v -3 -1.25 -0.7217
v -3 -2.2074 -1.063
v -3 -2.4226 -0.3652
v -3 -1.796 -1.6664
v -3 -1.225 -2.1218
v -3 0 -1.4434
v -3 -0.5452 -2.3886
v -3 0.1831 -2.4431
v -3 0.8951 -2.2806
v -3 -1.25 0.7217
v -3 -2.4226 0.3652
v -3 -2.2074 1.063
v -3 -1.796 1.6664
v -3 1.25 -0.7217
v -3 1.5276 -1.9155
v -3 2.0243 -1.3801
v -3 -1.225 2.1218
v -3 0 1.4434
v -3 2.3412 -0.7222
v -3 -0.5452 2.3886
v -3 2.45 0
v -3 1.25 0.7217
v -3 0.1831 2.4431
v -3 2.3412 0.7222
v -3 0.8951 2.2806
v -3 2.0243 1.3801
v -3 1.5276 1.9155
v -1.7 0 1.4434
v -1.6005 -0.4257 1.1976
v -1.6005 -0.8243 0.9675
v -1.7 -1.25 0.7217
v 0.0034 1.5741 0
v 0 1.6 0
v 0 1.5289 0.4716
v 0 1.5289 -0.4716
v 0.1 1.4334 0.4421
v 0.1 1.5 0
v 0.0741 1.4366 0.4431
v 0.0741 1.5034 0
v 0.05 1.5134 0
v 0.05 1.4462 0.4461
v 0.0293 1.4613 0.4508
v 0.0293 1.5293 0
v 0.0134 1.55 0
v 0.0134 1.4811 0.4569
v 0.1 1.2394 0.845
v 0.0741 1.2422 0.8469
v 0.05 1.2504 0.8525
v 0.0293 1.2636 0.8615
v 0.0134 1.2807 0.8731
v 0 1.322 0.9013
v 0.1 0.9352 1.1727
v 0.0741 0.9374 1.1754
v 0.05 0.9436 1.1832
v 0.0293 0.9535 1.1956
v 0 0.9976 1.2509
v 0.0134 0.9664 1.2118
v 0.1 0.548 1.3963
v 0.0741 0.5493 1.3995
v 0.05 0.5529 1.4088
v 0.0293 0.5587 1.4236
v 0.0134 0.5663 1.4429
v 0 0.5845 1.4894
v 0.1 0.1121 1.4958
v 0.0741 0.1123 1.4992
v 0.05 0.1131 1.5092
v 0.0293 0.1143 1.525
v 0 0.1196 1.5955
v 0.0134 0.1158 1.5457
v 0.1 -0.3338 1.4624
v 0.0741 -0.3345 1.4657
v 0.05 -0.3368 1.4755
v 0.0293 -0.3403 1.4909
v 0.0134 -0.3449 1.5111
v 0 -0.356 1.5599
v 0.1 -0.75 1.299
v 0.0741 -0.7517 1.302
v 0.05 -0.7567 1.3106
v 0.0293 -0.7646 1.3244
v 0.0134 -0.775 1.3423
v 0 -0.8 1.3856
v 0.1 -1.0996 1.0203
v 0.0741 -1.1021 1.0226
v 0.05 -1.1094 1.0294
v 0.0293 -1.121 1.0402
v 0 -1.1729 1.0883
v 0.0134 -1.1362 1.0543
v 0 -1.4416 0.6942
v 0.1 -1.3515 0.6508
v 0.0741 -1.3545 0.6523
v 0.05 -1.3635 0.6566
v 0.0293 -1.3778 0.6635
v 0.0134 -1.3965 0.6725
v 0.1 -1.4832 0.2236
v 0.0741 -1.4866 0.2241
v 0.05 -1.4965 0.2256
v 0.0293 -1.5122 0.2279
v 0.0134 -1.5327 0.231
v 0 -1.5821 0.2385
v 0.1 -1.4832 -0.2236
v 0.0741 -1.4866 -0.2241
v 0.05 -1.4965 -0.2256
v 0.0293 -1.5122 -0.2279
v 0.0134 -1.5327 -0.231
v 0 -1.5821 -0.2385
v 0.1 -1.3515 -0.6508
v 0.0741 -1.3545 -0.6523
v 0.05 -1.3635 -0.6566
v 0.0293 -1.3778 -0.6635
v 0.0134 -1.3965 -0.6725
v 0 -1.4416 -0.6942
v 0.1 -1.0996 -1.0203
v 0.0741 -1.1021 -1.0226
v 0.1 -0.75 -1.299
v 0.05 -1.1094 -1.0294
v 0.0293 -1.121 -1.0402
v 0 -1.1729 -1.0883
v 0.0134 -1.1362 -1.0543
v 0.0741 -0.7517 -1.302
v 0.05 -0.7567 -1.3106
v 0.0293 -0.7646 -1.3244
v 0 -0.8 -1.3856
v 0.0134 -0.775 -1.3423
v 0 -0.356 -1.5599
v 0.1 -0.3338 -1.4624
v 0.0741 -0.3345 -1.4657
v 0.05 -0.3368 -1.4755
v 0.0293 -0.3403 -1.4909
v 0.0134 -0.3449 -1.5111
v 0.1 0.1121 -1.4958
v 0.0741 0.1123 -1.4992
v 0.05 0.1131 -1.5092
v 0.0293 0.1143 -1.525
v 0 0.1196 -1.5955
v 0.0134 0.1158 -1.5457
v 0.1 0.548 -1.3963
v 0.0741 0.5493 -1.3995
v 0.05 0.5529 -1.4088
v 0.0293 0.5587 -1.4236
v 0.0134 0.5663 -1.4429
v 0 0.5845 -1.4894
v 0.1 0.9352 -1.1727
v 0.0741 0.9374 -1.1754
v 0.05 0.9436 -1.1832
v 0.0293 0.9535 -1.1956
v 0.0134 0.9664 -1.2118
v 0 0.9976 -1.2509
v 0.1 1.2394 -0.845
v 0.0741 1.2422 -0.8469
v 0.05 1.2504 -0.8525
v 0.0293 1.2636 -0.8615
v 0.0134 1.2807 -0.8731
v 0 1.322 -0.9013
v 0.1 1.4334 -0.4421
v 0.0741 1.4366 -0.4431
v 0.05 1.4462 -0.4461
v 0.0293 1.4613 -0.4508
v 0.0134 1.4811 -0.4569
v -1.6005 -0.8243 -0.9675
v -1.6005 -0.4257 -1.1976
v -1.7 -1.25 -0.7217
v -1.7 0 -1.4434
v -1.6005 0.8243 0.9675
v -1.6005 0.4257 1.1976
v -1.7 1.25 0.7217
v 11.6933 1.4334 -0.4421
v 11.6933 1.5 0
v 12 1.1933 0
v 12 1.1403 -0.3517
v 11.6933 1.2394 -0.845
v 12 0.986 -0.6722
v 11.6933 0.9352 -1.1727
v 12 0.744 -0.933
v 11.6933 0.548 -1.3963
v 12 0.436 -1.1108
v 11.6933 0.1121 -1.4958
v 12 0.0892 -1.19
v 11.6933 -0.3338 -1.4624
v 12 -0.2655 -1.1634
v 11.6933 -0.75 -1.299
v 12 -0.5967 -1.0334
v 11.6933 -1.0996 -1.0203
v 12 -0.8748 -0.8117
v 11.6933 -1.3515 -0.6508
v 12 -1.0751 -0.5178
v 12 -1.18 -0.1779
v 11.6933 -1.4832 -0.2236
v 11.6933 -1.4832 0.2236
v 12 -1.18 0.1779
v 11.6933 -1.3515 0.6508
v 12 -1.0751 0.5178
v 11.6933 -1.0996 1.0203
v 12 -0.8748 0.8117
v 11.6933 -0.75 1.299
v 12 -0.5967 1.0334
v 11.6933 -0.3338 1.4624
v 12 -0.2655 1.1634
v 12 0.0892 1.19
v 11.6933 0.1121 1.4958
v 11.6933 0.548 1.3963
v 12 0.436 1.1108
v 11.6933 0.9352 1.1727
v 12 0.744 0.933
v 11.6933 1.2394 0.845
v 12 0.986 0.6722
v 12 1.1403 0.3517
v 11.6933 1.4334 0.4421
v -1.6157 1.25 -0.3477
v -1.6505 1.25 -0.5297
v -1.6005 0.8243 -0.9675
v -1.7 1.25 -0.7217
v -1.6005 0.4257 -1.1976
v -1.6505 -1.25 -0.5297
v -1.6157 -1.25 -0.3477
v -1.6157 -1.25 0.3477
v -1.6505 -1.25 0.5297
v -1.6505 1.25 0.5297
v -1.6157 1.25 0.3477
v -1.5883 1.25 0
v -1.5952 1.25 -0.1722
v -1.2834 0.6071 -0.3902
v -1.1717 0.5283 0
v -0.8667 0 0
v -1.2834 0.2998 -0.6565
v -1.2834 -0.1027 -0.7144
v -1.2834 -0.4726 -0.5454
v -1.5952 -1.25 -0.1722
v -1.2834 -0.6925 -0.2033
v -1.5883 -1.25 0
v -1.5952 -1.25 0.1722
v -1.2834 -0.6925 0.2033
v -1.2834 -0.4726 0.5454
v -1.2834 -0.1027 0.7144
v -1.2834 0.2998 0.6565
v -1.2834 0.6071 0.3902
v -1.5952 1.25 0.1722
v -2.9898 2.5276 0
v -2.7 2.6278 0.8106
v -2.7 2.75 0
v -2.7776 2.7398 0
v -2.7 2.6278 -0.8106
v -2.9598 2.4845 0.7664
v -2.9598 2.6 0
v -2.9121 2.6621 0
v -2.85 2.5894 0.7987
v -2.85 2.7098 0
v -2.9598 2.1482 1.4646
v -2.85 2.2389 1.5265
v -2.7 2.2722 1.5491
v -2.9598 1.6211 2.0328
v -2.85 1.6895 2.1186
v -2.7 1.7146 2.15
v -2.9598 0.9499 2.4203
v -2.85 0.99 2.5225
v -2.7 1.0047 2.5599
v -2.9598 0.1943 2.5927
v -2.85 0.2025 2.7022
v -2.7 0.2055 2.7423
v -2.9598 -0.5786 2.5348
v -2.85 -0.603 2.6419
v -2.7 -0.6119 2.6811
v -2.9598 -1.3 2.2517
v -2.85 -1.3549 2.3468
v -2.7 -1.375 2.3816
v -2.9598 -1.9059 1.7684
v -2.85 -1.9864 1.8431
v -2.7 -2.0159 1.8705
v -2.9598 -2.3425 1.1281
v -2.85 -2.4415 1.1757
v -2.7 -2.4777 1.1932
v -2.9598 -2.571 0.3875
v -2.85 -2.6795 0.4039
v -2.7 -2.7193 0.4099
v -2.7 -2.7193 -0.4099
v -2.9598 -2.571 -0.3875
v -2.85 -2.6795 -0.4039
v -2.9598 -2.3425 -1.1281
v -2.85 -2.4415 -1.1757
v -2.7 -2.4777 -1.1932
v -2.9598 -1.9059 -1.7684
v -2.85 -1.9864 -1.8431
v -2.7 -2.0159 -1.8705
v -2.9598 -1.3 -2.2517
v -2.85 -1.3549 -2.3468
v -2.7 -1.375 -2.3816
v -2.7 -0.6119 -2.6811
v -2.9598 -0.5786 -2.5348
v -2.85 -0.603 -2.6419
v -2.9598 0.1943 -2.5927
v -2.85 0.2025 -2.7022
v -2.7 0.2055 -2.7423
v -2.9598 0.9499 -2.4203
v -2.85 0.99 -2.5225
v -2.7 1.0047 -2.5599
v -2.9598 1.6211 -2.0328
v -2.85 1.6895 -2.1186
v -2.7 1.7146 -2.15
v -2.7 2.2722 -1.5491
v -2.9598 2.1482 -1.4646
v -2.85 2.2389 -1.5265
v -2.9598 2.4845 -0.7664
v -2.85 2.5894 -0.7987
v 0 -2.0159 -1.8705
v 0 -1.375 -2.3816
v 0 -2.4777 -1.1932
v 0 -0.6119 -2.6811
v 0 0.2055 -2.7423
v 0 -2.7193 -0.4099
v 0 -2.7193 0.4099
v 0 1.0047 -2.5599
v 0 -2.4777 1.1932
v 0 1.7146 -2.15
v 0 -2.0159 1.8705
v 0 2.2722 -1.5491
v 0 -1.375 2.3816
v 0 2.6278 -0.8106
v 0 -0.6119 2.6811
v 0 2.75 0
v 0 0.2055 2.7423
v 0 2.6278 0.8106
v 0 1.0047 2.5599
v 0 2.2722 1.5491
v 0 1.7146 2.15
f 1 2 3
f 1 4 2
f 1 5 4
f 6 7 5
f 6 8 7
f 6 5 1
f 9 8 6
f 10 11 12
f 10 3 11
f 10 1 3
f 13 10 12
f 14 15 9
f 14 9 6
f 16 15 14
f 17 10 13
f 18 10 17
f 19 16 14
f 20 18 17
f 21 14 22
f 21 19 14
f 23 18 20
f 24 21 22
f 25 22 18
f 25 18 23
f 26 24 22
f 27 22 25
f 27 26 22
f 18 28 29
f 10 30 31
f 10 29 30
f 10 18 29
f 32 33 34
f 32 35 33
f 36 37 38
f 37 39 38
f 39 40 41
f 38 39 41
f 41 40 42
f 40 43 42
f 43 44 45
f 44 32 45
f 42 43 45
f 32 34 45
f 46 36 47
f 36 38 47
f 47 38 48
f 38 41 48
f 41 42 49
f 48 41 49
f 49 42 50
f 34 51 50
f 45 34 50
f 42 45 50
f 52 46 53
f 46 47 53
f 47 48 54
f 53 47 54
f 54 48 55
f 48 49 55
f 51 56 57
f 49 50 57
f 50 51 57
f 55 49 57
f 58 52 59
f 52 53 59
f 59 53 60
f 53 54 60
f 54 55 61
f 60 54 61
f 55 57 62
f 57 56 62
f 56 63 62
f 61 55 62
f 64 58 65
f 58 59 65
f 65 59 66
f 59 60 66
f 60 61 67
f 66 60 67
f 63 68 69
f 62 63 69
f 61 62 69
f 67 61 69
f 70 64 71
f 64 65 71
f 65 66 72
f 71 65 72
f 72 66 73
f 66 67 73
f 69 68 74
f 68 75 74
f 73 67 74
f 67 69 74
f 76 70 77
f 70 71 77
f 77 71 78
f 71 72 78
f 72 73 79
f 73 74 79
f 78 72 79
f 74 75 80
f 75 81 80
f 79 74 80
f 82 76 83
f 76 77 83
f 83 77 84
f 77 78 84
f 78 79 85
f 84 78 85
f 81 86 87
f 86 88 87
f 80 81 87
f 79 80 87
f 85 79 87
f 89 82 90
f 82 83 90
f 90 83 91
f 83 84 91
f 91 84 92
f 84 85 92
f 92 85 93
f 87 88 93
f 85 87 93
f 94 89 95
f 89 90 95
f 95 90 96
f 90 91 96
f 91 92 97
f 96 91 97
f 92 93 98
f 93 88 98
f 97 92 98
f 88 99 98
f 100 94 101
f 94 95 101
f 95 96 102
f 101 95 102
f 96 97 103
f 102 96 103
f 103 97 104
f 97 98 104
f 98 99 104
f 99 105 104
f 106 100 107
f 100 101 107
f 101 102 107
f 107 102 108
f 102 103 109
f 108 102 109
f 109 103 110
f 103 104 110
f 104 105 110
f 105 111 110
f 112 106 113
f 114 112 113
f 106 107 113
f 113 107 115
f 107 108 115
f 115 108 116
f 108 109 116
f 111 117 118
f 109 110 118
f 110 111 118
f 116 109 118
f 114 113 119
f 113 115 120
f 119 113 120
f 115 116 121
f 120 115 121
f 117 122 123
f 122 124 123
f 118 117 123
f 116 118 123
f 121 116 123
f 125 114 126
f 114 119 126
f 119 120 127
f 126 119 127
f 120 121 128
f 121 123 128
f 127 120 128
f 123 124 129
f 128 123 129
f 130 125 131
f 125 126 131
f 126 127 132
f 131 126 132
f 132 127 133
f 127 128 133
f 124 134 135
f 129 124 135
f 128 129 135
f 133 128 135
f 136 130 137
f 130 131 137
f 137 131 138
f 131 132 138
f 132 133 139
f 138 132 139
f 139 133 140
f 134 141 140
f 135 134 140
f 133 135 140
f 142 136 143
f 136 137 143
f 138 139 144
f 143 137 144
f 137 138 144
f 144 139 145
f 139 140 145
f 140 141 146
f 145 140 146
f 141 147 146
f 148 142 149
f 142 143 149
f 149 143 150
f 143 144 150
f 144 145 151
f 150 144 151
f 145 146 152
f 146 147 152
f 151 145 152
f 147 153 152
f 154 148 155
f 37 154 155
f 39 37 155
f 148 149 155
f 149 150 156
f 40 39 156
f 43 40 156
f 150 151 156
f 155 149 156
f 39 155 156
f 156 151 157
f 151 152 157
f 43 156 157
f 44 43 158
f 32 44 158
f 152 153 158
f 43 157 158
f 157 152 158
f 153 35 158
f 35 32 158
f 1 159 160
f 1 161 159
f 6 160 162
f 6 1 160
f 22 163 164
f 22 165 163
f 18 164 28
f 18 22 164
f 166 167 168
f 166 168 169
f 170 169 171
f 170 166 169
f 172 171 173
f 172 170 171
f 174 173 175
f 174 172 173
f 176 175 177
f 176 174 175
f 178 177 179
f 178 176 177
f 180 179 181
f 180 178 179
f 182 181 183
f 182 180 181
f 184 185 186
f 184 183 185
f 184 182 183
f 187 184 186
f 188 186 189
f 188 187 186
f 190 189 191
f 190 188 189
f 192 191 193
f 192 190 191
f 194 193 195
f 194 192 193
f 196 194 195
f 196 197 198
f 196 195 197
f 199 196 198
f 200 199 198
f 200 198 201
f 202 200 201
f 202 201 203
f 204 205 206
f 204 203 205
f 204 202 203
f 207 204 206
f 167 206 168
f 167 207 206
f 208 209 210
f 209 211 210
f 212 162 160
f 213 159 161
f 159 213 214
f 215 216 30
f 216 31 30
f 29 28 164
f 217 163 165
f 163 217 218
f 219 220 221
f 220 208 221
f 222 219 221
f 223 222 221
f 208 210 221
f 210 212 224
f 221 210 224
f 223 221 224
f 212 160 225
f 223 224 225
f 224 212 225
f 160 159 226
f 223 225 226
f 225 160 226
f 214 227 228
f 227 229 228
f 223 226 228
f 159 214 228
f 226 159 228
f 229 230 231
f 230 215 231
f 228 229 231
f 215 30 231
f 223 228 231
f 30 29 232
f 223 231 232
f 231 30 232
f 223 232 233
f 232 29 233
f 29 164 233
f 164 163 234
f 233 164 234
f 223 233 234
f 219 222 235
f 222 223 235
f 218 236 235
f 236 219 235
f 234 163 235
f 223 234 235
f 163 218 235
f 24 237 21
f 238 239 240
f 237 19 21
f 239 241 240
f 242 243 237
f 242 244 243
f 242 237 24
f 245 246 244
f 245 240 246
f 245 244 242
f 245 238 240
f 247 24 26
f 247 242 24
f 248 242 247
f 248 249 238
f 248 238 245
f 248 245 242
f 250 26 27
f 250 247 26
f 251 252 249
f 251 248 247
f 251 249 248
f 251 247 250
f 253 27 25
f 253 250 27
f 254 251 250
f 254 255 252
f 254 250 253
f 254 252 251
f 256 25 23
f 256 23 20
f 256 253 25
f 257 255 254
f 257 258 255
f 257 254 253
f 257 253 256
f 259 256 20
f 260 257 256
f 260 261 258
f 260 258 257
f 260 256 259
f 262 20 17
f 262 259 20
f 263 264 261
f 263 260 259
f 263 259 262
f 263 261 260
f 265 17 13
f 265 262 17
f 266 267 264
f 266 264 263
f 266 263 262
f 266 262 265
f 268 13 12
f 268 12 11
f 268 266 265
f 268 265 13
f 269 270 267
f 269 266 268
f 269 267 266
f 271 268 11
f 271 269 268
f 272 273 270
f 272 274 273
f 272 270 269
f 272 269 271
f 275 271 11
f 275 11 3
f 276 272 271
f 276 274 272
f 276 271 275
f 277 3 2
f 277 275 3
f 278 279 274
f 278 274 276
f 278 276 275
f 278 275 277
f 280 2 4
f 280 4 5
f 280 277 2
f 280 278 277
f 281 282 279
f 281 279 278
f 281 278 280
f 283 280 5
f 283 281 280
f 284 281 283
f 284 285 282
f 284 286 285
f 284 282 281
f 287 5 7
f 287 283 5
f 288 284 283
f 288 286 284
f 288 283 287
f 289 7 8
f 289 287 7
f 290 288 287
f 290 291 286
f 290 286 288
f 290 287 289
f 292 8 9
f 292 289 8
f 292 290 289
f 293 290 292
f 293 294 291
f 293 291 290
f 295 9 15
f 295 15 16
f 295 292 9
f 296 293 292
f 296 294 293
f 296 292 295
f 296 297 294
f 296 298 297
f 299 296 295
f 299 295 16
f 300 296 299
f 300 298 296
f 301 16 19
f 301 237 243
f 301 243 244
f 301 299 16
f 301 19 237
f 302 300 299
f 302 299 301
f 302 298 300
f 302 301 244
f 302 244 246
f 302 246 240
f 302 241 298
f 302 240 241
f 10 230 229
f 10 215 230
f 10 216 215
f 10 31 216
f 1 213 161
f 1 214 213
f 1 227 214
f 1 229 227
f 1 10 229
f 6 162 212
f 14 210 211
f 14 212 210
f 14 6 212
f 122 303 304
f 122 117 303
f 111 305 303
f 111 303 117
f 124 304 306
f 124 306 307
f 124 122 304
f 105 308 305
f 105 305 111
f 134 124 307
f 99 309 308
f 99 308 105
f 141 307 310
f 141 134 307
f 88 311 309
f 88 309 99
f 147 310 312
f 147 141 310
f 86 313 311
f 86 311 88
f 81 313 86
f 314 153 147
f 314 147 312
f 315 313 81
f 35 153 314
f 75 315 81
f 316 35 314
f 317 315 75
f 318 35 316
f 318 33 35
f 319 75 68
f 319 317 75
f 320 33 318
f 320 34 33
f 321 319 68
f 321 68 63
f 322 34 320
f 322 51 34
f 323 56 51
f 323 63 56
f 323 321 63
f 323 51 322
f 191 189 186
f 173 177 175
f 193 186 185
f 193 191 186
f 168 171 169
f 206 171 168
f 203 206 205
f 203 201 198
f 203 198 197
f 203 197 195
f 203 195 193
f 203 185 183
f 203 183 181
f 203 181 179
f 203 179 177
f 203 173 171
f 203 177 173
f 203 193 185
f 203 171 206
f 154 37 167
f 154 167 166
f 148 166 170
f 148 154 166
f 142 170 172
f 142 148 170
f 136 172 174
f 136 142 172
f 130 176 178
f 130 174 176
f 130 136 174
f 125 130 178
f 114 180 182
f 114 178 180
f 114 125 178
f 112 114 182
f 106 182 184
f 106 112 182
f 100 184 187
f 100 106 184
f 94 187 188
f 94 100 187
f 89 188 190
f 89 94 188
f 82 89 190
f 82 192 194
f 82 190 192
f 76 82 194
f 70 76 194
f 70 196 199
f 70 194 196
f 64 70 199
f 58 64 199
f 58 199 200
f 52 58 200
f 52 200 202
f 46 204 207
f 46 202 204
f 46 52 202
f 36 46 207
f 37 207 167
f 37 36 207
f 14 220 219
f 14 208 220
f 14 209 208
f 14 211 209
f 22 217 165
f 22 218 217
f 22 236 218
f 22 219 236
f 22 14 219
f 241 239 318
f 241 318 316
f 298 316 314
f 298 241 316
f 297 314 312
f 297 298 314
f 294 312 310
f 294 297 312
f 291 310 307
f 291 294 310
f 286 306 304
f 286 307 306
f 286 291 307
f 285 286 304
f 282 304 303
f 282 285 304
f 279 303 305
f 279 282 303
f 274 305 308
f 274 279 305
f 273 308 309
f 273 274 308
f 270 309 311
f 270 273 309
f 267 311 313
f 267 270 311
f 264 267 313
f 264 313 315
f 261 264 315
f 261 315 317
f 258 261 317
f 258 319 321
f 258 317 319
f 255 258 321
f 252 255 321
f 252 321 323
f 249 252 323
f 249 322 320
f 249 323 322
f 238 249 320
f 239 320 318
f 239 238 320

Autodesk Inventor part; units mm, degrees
ref_plane "YZ Plane" through (0, 0, 0) normal (1, 0, 0) x (0, 1, 0)
ref_plane "XZ Plane" through (0, 0, 0) normal (0, 1, 0) x (-1, 0, 0)
sketch "Skizze1" plane through (0, 0, 0) normal (0, 0, 1) x (1, 0, 0)
  line L0 (-0.8667, 0) -> (12, 0)
  line L1 (12, 0) -> (12, 1.5)
  line L2 (12, 1.5) -> (1.25, 1.5)
  line L3 (1.25, 1.5) -> (0.9432, 1.5)
  line L4 (0.9432, 1.5) -> (0, 1.5)
  line L5 (0, 1.5) -> (0, 2.75)
  line L6 (0, 2.75) -> (-3, 2.75)
  line L7 (-3, 2.75) -> (-3, 1.4434)
  line L8 (-3, 1.4434) -> (-1.7, 1.4434)
  line L9 (-1.7, 1.4434) -> (-0.8667, 0)
  line L10 (-6, 0) -> (15, 0) projected
  line L11 (0, -0.55) -> (0, 3.3) projected
  line L12 (1.25, 1.5) -> (0, 1.5) construction
  dimension "d1" = 10.75
  dimension "d2" = 0.3068
  dimension "d3" = 3
  dimension "d4" = 1.3
  dimension "d5" = 60
  dimension "d6" = 3
  dimension "d7" = 3
  dimension "d8" = 2.8868
  dimension "d9" = 5.5
  dimension "d26" = 12
revolve "Körper" add sketch "Skizze1" angle 360 about axis through (-0.8667, 0, 0) along (1, 0, 0)
sketch "Skizze2" plane through (-3, 0, 0) normal (-1, 0, 0) x (0, 0, 1)
  circle A0 centre (0, 0) radius 1.4434 projected
  line L0 (0, -3.85) -> (0, 3.85) projected
  line L1 (-3.85, 0) -> (3.85, 0) projected
  line L2 (1.4434, 0) -> (0.7217, -1.25)
  line L3 (0.7217, -1.25) -> (-0.7217, -1.25)
  line L4 (-0.7217, -1.25) -> (-1.4434, 0)
  line L5 (-1.4434, 0) -> (-0.7217, 1.25)
  line L6 (-0.7217, 1.25) -> (0.7217, 1.25)
  line L7 (0.7217, 1.25) -> (1.4434, 0)
  point P0 (0, 0)
extrude "Loch" add sketch "Skizze2" against normal up to next contours L7 A0 | A0 L2 | L6 L0 A0 | A0 L0 L3 | L0 L6 A0 | A0 L3 L0 | L4 A0 | A0 L5
fillet "Rundung1" radius 0.3 1 edges at (-3, -2.75, 0)
thread "Gewinde" size "M3x0.5" class "6g" standard "ISO Metric profile" length 10.75
chamfer "Fase1" distance 0.3067 distance2 0.3067 1 edges at (12, -1.5, 0) measured on face at (12, -0.6587, -0.1791)
ref_plane "Work Plane1" through (29, 0, 0) normal (0, -1, 0) x (1, 0, 0)
fillet "Fillet2" radius 0.1 1 edges at (0, -1.5, 0)
sketch "Skizze4" plane through (12, 0, 0) normal (1, 0, 0) x (0, 0, -1)
  point P0 (0, 0)
equation "\"d1\" = GEL"
equation "\"d3\" = KOH"
equation "\"d4\" = INTI"
equation "\"d6\" = GD"
equation "\"d7\" = BDM"
equation "\"d8\" = 1.1547 * SW"
equation "\"d9\" = KOD"
equation "\"d26\" = NLG"
equation "\"d30\" = R"
equation "\"d17\" = RR"
equation "\"d13\" = GEL"
equation "\"d15\" = -0.5 * SPD + 0.5 * GD"
equation "\"d16\" = GUL"
equation "\"GD\" = NND"
equation "\"NLG\" = 12"
equation "\"GEL\" = 10.75"
equation "\"KOD\" = 5.5"
equation "\"KOH\" = 3"
equation "\"INTI\" = 1.3"
equation "\"GAL\" = 0.61345 * PTC"
equation "\"GUL\" = 0.61345 * PTC"
equation "\"BDM\" = NND"
equation "\"SW\" = 2.5"
equation "\"RR\" = 0.3"
equation "\"SPD\" = NND - 1.2269 * PTC"
equation "\"R\" = 0.1"
equation "\"TOA\" = 30deg"
equation "\"GD1\" = THREADDIA - 1.2269 * PTC"
equation "\"THREADDIA\" = 3"
equation "\"FAWI\" = 45deg"
equation "\"ANG\" = 120deg"
equation "\"PTC\" = 0.5"
equation "\"NND\" = 3"
equation "\"E0\" = 1.155 * SW"
properties part number "DIN 912 - M3 x 12" material "Stahl, weich"
